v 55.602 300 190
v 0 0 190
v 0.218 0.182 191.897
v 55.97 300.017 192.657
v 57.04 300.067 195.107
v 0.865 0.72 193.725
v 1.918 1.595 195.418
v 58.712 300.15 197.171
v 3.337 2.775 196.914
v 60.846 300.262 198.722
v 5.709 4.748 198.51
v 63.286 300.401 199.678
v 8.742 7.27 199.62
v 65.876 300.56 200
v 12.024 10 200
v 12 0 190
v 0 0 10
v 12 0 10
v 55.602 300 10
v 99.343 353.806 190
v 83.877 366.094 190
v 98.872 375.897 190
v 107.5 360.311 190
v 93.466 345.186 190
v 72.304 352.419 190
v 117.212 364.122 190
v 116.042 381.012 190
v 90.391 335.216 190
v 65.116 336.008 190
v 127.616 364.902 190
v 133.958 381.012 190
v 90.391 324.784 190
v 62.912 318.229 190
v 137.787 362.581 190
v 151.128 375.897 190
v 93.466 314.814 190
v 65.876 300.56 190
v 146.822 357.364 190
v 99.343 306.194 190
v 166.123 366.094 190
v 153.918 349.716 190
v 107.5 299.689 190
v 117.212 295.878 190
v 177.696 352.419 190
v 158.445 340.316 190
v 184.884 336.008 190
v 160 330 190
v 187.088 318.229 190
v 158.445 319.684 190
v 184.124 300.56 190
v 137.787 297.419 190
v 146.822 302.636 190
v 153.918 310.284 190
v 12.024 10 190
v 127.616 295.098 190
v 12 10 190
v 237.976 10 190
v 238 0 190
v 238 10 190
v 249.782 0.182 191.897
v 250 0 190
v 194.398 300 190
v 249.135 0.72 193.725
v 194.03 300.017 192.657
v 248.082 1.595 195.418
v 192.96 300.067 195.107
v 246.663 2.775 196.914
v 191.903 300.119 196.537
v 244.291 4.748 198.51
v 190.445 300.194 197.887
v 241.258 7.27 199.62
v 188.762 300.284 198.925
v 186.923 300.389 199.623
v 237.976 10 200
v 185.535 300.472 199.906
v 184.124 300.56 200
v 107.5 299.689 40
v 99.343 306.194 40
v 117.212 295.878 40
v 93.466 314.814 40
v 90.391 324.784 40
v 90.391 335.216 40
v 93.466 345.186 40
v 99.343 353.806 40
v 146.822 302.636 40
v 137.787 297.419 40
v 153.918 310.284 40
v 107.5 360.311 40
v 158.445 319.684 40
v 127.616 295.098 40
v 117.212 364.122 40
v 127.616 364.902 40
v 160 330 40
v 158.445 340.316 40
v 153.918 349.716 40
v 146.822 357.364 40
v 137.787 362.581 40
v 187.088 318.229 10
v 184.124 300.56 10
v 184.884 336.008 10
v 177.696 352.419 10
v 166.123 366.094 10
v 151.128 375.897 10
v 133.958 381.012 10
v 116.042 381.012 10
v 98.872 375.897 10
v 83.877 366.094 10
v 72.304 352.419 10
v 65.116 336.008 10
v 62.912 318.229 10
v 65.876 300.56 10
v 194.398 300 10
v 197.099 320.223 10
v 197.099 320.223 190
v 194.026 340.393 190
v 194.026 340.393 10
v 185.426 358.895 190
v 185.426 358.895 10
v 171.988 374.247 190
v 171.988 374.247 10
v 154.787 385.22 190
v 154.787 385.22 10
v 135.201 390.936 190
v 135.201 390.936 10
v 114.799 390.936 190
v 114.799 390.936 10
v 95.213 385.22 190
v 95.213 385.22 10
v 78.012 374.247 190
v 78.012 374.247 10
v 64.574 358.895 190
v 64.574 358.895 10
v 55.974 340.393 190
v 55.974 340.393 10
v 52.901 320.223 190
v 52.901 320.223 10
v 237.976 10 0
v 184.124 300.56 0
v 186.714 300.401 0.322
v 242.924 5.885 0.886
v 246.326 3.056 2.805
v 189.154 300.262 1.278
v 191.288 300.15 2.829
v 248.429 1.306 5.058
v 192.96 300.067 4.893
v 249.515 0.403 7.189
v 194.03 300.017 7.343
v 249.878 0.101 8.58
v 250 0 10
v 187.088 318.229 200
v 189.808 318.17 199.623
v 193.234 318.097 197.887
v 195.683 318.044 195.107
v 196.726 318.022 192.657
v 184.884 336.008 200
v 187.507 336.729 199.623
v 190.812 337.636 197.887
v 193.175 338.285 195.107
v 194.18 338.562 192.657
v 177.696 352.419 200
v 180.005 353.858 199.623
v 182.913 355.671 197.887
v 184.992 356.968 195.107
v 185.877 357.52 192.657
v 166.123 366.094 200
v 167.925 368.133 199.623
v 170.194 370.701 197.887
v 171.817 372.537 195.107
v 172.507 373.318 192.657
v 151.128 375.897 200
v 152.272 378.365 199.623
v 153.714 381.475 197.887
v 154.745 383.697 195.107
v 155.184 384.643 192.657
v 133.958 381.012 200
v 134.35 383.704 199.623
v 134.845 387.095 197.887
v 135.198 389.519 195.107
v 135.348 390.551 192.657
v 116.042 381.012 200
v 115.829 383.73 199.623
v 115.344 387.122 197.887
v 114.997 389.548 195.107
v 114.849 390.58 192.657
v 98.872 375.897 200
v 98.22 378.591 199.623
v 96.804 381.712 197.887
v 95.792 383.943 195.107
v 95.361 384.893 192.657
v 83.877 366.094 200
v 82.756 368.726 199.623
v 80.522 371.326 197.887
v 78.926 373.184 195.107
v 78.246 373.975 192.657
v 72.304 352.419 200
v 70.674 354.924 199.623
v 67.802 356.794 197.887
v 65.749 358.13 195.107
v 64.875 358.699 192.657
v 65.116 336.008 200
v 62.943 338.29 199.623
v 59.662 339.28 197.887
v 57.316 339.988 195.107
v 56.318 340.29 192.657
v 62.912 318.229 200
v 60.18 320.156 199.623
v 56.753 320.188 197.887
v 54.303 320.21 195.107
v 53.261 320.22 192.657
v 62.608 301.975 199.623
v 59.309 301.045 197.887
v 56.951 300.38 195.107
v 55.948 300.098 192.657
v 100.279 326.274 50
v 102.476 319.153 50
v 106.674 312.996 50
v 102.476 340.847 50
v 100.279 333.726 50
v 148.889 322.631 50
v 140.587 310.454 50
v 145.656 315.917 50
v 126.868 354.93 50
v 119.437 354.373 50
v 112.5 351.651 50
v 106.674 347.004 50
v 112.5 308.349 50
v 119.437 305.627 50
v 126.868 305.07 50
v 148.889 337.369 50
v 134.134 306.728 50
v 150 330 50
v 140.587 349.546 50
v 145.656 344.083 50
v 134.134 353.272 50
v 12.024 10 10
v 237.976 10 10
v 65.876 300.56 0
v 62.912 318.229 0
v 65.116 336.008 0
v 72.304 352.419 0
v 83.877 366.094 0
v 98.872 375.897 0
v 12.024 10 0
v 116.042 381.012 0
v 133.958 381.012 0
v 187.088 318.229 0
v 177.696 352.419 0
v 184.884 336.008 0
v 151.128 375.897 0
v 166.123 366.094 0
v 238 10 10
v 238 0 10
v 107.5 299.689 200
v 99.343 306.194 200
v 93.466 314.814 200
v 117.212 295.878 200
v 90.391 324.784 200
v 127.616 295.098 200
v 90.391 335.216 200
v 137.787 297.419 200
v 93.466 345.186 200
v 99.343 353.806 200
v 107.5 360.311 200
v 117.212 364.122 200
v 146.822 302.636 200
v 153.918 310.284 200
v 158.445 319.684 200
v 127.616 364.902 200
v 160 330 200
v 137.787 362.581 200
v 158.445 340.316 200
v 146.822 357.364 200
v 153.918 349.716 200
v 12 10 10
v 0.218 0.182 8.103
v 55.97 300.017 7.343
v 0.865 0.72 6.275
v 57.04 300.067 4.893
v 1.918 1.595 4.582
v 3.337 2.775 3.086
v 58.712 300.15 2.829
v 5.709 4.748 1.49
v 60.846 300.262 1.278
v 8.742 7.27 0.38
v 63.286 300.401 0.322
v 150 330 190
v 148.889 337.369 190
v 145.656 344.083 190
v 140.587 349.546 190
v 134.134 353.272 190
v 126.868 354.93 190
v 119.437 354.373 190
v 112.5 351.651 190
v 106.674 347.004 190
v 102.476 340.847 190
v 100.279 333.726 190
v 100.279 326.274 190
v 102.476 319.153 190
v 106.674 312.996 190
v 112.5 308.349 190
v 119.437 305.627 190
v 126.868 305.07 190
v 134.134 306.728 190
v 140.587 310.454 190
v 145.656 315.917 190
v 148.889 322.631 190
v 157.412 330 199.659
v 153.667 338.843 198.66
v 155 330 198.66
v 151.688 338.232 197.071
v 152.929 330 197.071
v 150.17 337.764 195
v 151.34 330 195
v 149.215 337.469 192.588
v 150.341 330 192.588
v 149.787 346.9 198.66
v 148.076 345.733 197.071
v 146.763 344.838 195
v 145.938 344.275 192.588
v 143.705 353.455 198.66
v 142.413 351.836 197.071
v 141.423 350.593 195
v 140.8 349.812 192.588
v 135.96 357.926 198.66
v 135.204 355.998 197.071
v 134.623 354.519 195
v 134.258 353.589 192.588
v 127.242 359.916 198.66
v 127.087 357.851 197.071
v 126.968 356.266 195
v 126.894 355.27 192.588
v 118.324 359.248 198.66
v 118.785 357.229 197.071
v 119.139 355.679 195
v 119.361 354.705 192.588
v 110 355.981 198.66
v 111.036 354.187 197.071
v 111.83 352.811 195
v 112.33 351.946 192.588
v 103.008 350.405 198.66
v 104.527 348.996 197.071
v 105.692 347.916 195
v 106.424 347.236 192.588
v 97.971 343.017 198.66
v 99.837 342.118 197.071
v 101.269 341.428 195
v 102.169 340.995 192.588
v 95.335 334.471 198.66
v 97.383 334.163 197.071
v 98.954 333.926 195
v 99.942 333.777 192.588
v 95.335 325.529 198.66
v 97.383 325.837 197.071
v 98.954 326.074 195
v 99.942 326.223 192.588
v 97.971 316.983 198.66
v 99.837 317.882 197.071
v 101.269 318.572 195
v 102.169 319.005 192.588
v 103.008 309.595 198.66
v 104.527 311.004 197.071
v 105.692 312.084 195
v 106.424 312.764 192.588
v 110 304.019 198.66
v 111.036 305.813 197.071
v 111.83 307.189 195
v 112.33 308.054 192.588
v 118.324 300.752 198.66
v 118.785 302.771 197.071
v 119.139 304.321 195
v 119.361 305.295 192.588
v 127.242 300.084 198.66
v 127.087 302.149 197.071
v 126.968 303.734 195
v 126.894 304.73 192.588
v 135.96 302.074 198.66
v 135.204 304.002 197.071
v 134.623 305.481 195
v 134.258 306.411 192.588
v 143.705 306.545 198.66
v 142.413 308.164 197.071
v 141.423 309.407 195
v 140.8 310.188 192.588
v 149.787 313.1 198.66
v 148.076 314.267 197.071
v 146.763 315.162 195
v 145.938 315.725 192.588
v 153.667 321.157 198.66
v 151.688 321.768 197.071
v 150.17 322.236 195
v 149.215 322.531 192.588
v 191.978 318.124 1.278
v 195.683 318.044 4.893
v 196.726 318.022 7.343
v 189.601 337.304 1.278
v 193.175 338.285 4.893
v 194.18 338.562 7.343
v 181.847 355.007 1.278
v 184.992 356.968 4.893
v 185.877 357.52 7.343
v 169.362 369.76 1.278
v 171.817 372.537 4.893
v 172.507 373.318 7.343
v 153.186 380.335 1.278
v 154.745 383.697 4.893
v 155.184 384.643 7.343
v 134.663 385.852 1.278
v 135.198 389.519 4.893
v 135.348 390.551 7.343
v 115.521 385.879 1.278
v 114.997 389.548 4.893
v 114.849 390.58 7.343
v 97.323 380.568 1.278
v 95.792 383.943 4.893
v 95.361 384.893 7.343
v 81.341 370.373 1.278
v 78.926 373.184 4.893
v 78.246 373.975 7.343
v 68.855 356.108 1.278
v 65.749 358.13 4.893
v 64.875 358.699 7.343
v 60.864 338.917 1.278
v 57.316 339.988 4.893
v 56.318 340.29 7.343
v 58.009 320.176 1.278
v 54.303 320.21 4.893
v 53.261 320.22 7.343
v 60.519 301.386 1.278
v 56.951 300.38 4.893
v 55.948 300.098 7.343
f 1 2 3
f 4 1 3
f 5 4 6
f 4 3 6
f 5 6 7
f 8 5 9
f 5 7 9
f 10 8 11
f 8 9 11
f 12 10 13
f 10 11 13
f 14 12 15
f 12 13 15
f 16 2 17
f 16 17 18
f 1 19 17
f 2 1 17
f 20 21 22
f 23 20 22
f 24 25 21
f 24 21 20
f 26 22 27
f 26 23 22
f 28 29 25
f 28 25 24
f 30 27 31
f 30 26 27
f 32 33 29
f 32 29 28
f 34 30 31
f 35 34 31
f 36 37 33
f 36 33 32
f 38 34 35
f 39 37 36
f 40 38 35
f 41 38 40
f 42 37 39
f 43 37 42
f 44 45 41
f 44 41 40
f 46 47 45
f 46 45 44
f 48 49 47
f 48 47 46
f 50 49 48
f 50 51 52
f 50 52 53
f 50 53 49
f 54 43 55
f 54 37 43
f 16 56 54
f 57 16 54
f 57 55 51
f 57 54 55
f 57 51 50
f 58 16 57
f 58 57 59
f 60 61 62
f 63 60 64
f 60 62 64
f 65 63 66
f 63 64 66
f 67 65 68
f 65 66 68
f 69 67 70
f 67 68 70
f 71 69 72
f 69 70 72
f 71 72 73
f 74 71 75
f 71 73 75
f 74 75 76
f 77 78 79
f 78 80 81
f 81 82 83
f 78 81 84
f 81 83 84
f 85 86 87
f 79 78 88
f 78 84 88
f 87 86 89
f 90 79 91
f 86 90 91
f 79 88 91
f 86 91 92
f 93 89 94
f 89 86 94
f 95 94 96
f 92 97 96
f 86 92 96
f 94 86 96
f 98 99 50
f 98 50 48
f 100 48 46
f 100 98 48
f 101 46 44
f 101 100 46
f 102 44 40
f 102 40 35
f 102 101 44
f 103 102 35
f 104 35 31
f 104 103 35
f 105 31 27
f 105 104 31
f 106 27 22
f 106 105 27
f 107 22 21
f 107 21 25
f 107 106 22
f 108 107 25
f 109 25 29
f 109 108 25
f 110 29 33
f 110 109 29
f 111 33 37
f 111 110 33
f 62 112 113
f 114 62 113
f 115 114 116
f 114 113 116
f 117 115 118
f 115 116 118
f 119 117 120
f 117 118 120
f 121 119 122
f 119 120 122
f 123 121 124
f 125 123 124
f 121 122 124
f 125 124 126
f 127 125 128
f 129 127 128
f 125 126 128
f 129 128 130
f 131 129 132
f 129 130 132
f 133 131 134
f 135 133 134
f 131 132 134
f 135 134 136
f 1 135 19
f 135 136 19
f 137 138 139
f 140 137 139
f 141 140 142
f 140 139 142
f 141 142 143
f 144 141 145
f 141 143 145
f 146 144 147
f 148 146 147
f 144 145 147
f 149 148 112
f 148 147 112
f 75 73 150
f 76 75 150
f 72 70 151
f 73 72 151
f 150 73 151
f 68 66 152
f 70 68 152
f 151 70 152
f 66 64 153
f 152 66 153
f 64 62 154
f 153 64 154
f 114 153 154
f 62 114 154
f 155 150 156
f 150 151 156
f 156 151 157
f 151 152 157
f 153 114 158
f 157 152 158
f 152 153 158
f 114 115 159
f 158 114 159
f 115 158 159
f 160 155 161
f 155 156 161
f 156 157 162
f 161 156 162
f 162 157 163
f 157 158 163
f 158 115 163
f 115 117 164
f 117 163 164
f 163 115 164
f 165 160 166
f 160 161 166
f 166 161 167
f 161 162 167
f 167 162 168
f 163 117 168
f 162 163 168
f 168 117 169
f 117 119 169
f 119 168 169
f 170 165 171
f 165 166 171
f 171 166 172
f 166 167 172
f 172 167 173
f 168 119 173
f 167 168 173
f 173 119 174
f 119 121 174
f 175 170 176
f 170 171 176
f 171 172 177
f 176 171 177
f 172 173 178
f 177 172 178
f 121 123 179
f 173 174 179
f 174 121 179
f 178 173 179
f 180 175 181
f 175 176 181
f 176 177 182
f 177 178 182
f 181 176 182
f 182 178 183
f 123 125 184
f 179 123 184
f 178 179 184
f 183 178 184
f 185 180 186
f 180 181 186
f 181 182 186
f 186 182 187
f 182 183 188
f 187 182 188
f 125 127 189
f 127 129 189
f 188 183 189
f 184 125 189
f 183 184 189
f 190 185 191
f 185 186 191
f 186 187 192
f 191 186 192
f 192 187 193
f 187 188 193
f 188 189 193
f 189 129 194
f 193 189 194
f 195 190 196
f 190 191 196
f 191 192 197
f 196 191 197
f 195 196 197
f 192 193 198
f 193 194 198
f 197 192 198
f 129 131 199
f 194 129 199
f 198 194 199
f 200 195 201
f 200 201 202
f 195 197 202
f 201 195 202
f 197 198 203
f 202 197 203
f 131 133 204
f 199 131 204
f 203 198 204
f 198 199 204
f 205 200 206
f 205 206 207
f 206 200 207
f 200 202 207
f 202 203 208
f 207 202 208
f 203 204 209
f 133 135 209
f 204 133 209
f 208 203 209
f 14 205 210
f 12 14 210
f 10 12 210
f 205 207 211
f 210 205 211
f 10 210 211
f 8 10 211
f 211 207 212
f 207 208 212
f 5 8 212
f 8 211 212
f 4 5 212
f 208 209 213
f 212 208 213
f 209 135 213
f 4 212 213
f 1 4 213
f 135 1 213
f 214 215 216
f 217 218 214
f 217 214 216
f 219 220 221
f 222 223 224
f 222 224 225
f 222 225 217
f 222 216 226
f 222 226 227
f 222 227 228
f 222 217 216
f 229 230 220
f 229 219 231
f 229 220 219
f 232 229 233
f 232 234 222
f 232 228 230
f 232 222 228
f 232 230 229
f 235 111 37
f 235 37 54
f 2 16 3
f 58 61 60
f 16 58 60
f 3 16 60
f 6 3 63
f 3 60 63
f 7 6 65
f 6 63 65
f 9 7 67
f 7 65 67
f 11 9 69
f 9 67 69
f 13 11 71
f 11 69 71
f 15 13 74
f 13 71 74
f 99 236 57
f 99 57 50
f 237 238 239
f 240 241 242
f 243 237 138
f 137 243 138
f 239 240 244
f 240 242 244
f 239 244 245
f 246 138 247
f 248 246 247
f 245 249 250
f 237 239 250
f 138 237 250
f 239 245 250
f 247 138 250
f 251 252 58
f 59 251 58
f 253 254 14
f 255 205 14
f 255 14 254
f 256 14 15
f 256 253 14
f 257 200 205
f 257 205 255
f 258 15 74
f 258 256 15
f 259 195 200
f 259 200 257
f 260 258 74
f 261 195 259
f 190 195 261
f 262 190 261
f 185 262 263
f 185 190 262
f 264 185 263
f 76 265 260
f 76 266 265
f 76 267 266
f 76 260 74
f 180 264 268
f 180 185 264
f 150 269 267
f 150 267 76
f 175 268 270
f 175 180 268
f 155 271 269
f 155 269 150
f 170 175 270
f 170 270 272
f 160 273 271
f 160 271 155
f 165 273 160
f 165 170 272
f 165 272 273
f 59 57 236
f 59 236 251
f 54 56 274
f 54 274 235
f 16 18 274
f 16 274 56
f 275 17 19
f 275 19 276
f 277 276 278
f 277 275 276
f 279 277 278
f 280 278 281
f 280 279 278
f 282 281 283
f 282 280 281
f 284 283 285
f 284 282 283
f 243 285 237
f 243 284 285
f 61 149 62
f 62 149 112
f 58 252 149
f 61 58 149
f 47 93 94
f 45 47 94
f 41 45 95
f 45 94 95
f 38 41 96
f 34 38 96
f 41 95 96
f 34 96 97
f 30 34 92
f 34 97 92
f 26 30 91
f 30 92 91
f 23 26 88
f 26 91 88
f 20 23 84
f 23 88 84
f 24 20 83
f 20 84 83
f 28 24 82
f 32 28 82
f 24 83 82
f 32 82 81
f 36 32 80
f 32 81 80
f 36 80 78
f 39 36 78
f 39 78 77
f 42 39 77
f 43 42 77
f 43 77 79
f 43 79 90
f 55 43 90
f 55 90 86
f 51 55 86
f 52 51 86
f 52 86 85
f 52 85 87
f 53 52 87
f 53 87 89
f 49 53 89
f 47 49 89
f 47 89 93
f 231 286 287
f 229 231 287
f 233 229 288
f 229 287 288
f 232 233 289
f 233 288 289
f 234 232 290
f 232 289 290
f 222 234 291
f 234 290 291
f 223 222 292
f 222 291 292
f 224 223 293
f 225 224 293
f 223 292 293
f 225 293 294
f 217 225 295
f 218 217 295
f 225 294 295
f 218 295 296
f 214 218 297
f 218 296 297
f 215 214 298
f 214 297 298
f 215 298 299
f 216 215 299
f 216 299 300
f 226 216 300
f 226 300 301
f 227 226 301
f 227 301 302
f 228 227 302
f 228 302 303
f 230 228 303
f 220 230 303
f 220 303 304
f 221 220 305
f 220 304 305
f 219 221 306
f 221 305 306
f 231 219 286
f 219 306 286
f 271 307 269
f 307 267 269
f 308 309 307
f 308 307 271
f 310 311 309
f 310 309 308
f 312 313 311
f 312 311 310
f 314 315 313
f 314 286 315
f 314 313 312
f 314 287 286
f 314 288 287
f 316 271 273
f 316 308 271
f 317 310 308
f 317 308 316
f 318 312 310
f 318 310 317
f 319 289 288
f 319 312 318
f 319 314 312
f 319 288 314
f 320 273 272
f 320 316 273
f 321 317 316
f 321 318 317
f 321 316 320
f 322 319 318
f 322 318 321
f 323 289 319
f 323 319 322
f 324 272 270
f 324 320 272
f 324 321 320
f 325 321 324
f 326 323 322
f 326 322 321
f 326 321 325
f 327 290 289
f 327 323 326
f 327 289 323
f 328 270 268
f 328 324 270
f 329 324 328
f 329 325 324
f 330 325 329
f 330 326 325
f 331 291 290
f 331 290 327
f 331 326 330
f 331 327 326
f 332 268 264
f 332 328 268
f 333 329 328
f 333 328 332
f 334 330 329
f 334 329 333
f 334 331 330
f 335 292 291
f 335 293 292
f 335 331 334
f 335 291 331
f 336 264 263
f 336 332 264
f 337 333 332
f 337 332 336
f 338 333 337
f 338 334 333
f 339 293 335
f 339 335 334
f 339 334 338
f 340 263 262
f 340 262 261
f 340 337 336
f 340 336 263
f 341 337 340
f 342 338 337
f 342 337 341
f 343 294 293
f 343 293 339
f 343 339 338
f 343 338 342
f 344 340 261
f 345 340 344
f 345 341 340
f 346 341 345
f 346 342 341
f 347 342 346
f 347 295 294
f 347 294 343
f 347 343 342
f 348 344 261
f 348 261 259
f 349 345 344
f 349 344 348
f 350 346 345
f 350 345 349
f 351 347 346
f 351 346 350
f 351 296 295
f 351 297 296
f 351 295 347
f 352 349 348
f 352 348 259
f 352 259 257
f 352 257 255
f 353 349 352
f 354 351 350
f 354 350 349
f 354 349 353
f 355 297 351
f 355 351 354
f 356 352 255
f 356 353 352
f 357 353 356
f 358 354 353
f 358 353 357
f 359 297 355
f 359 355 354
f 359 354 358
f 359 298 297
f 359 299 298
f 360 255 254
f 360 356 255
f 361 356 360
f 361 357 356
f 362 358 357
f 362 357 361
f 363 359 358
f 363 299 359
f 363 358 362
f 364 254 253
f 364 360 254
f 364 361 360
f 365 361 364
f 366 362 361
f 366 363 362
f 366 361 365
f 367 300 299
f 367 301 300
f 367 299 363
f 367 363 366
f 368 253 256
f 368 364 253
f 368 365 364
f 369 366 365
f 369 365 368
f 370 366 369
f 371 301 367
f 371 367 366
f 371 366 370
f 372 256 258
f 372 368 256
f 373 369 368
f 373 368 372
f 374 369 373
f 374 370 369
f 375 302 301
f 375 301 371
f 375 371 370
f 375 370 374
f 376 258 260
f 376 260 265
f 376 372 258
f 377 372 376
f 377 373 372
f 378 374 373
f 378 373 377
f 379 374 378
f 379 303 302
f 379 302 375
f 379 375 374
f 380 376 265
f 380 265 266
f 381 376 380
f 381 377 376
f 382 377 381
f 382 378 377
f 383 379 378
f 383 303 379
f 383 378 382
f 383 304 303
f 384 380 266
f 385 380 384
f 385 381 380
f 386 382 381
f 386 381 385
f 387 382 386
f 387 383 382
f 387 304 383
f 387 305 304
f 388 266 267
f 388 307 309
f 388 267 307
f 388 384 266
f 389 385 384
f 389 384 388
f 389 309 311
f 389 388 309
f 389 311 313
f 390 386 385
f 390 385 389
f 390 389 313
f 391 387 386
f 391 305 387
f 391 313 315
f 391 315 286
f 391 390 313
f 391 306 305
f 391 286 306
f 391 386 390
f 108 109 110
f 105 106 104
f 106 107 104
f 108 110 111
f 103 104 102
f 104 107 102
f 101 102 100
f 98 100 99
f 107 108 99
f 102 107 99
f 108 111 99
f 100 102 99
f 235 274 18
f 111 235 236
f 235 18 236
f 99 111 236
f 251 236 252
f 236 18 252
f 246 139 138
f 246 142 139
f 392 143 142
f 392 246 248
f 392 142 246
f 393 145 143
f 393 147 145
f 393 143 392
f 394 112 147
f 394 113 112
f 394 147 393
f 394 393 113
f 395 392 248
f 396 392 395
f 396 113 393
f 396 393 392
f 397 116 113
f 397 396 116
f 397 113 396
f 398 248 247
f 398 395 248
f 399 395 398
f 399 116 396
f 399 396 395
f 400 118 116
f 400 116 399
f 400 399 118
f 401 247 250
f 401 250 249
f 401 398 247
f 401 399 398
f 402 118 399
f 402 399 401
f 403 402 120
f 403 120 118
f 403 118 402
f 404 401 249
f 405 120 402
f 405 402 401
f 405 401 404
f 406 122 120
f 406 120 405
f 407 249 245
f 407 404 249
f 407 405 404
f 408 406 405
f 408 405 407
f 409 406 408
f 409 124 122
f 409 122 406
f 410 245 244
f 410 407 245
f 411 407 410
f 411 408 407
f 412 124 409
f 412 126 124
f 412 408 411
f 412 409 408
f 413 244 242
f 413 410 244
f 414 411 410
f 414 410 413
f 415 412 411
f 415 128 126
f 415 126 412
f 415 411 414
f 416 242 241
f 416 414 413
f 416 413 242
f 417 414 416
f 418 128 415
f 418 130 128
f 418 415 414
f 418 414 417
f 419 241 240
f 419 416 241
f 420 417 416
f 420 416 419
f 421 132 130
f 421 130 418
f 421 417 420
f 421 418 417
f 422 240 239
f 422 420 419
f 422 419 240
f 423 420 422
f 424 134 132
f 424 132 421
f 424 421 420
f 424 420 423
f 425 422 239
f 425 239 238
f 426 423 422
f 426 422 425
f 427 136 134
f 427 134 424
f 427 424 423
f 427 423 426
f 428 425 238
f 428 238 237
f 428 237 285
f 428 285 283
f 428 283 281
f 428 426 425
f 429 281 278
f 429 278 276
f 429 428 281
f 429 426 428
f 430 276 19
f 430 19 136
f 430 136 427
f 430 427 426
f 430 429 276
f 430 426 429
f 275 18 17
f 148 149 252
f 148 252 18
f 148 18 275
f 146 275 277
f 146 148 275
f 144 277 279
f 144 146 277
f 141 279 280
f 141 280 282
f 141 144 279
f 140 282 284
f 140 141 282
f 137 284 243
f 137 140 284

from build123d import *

# Parameters (mm, degrees)
BOSS_EXTRUDE1_DEPTH = 200
SKETCH3_R           = 25
CUT_EXTRUDE2_DEPTH  = 150
FILLET1_R           = 10
FILLET2_R           = 10
SHELL1_START        = 10
SHELL1_OUTLINE_R    = 35
SHELL1_DEPTH        = 180
SHELL1_2_OUTLINE_R  = 35
SHELL1_2_DEPTH      = 30
SKETCH4_W           = 226
SKETCH4_H           = 180
CUT_EXTRUDE4_DEPTH  = 10


# Read off the part's stored shape, not the designer's step: Shell1
with BuildPart() as part:
    # Sketch1 → Boss-Extrude1 (new body)
    with BuildSketch(Plane.XY):
        with BuildLine():
            Line((0, 0), (250, 0))
            Line((250, 0), (194.398287, 300))
            ThreePointArc((194.398287, 300), (125, 391.661115), (55.601713, 300))
            Line((55.601713, 300), (0, 0))
        make_face()
    extrude(amount=BOSS_EXTRUDE1_DEPTH)

    # Sketch3 → Cut-Extrude2 (cut)
    with BuildSketch(Plane.XY.offset(200)):
        with Locations((125, 330)):
            Circle(SKETCH3_R)
    extrude(amount=-CUT_EXTRUDE2_DEPTH, mode=Mode.SUBTRACT)

    # Fillet1
    fillet1_edges = [part.edges().sort_by_distance(p)[0] for p in [
        (222.199143, 150, 200),
        (125, 391.661115, 200),
        (100, 330, 200),
        (27.800857, 150, 200),
        (125, 0, 200),
    ]]
    fillet(fillet1_edges, radius=FILLET1_R)

    # Fillet2
    fillet2_edges = [part.edges().sort_by_distance(p)[0] for p in [
        (125, 391.661115, 0),
        (222.199143, 150, 0),
        (125, 0, 0),
        (27.800857, 150, 0),
    ]]
    fillet(fillet2_edges, radius=FILLET2_R)

    # Shell1 outline → Shell1 (cut)
    with BuildSketch(Plane.XY.offset(SHELL1_START)):
        with BuildLine():
            Line((65.875786, 300.559892), (12.023693, 10))
            Line((12.023693, 10), (237.976307, 10))
            Line((237.976307, 10), (184.124214, 300.559892))
            ThreePointArc((184.124214, 300.559892), (125, 381.661115), (65.875786, 300.559892))
        make_face()
        with Locations((125, 330)):
            Circle(SHELL1_OUTLINE_R, mode=Mode.SUBTRACT)
    extrude(amount=SHELL1_DEPTH, mode=Mode.SUBTRACT)

    # Shell1 2 outline → Shell1 2 (cut)
    with BuildSketch(Plane.XY.offset(SHELL1_START)):
        with Locations((125, 330)):
            Circle(SHELL1_2_OUTLINE_R)
    extrude(amount=SHELL1_2_DEPTH, mode=Mode.SUBTRACT)

    # Sketch4 → Cut-Extrude4 (cut)
    with BuildSketch(Plane.XZ):
        with Locations((125, 100)):
            Rectangle(SKETCH4_W, SKETCH4_H)
    extrude(amount=-CUT_EXTRUDE4_DEPTH, mode=Mode.SUBTRACT)


solid = part.part
